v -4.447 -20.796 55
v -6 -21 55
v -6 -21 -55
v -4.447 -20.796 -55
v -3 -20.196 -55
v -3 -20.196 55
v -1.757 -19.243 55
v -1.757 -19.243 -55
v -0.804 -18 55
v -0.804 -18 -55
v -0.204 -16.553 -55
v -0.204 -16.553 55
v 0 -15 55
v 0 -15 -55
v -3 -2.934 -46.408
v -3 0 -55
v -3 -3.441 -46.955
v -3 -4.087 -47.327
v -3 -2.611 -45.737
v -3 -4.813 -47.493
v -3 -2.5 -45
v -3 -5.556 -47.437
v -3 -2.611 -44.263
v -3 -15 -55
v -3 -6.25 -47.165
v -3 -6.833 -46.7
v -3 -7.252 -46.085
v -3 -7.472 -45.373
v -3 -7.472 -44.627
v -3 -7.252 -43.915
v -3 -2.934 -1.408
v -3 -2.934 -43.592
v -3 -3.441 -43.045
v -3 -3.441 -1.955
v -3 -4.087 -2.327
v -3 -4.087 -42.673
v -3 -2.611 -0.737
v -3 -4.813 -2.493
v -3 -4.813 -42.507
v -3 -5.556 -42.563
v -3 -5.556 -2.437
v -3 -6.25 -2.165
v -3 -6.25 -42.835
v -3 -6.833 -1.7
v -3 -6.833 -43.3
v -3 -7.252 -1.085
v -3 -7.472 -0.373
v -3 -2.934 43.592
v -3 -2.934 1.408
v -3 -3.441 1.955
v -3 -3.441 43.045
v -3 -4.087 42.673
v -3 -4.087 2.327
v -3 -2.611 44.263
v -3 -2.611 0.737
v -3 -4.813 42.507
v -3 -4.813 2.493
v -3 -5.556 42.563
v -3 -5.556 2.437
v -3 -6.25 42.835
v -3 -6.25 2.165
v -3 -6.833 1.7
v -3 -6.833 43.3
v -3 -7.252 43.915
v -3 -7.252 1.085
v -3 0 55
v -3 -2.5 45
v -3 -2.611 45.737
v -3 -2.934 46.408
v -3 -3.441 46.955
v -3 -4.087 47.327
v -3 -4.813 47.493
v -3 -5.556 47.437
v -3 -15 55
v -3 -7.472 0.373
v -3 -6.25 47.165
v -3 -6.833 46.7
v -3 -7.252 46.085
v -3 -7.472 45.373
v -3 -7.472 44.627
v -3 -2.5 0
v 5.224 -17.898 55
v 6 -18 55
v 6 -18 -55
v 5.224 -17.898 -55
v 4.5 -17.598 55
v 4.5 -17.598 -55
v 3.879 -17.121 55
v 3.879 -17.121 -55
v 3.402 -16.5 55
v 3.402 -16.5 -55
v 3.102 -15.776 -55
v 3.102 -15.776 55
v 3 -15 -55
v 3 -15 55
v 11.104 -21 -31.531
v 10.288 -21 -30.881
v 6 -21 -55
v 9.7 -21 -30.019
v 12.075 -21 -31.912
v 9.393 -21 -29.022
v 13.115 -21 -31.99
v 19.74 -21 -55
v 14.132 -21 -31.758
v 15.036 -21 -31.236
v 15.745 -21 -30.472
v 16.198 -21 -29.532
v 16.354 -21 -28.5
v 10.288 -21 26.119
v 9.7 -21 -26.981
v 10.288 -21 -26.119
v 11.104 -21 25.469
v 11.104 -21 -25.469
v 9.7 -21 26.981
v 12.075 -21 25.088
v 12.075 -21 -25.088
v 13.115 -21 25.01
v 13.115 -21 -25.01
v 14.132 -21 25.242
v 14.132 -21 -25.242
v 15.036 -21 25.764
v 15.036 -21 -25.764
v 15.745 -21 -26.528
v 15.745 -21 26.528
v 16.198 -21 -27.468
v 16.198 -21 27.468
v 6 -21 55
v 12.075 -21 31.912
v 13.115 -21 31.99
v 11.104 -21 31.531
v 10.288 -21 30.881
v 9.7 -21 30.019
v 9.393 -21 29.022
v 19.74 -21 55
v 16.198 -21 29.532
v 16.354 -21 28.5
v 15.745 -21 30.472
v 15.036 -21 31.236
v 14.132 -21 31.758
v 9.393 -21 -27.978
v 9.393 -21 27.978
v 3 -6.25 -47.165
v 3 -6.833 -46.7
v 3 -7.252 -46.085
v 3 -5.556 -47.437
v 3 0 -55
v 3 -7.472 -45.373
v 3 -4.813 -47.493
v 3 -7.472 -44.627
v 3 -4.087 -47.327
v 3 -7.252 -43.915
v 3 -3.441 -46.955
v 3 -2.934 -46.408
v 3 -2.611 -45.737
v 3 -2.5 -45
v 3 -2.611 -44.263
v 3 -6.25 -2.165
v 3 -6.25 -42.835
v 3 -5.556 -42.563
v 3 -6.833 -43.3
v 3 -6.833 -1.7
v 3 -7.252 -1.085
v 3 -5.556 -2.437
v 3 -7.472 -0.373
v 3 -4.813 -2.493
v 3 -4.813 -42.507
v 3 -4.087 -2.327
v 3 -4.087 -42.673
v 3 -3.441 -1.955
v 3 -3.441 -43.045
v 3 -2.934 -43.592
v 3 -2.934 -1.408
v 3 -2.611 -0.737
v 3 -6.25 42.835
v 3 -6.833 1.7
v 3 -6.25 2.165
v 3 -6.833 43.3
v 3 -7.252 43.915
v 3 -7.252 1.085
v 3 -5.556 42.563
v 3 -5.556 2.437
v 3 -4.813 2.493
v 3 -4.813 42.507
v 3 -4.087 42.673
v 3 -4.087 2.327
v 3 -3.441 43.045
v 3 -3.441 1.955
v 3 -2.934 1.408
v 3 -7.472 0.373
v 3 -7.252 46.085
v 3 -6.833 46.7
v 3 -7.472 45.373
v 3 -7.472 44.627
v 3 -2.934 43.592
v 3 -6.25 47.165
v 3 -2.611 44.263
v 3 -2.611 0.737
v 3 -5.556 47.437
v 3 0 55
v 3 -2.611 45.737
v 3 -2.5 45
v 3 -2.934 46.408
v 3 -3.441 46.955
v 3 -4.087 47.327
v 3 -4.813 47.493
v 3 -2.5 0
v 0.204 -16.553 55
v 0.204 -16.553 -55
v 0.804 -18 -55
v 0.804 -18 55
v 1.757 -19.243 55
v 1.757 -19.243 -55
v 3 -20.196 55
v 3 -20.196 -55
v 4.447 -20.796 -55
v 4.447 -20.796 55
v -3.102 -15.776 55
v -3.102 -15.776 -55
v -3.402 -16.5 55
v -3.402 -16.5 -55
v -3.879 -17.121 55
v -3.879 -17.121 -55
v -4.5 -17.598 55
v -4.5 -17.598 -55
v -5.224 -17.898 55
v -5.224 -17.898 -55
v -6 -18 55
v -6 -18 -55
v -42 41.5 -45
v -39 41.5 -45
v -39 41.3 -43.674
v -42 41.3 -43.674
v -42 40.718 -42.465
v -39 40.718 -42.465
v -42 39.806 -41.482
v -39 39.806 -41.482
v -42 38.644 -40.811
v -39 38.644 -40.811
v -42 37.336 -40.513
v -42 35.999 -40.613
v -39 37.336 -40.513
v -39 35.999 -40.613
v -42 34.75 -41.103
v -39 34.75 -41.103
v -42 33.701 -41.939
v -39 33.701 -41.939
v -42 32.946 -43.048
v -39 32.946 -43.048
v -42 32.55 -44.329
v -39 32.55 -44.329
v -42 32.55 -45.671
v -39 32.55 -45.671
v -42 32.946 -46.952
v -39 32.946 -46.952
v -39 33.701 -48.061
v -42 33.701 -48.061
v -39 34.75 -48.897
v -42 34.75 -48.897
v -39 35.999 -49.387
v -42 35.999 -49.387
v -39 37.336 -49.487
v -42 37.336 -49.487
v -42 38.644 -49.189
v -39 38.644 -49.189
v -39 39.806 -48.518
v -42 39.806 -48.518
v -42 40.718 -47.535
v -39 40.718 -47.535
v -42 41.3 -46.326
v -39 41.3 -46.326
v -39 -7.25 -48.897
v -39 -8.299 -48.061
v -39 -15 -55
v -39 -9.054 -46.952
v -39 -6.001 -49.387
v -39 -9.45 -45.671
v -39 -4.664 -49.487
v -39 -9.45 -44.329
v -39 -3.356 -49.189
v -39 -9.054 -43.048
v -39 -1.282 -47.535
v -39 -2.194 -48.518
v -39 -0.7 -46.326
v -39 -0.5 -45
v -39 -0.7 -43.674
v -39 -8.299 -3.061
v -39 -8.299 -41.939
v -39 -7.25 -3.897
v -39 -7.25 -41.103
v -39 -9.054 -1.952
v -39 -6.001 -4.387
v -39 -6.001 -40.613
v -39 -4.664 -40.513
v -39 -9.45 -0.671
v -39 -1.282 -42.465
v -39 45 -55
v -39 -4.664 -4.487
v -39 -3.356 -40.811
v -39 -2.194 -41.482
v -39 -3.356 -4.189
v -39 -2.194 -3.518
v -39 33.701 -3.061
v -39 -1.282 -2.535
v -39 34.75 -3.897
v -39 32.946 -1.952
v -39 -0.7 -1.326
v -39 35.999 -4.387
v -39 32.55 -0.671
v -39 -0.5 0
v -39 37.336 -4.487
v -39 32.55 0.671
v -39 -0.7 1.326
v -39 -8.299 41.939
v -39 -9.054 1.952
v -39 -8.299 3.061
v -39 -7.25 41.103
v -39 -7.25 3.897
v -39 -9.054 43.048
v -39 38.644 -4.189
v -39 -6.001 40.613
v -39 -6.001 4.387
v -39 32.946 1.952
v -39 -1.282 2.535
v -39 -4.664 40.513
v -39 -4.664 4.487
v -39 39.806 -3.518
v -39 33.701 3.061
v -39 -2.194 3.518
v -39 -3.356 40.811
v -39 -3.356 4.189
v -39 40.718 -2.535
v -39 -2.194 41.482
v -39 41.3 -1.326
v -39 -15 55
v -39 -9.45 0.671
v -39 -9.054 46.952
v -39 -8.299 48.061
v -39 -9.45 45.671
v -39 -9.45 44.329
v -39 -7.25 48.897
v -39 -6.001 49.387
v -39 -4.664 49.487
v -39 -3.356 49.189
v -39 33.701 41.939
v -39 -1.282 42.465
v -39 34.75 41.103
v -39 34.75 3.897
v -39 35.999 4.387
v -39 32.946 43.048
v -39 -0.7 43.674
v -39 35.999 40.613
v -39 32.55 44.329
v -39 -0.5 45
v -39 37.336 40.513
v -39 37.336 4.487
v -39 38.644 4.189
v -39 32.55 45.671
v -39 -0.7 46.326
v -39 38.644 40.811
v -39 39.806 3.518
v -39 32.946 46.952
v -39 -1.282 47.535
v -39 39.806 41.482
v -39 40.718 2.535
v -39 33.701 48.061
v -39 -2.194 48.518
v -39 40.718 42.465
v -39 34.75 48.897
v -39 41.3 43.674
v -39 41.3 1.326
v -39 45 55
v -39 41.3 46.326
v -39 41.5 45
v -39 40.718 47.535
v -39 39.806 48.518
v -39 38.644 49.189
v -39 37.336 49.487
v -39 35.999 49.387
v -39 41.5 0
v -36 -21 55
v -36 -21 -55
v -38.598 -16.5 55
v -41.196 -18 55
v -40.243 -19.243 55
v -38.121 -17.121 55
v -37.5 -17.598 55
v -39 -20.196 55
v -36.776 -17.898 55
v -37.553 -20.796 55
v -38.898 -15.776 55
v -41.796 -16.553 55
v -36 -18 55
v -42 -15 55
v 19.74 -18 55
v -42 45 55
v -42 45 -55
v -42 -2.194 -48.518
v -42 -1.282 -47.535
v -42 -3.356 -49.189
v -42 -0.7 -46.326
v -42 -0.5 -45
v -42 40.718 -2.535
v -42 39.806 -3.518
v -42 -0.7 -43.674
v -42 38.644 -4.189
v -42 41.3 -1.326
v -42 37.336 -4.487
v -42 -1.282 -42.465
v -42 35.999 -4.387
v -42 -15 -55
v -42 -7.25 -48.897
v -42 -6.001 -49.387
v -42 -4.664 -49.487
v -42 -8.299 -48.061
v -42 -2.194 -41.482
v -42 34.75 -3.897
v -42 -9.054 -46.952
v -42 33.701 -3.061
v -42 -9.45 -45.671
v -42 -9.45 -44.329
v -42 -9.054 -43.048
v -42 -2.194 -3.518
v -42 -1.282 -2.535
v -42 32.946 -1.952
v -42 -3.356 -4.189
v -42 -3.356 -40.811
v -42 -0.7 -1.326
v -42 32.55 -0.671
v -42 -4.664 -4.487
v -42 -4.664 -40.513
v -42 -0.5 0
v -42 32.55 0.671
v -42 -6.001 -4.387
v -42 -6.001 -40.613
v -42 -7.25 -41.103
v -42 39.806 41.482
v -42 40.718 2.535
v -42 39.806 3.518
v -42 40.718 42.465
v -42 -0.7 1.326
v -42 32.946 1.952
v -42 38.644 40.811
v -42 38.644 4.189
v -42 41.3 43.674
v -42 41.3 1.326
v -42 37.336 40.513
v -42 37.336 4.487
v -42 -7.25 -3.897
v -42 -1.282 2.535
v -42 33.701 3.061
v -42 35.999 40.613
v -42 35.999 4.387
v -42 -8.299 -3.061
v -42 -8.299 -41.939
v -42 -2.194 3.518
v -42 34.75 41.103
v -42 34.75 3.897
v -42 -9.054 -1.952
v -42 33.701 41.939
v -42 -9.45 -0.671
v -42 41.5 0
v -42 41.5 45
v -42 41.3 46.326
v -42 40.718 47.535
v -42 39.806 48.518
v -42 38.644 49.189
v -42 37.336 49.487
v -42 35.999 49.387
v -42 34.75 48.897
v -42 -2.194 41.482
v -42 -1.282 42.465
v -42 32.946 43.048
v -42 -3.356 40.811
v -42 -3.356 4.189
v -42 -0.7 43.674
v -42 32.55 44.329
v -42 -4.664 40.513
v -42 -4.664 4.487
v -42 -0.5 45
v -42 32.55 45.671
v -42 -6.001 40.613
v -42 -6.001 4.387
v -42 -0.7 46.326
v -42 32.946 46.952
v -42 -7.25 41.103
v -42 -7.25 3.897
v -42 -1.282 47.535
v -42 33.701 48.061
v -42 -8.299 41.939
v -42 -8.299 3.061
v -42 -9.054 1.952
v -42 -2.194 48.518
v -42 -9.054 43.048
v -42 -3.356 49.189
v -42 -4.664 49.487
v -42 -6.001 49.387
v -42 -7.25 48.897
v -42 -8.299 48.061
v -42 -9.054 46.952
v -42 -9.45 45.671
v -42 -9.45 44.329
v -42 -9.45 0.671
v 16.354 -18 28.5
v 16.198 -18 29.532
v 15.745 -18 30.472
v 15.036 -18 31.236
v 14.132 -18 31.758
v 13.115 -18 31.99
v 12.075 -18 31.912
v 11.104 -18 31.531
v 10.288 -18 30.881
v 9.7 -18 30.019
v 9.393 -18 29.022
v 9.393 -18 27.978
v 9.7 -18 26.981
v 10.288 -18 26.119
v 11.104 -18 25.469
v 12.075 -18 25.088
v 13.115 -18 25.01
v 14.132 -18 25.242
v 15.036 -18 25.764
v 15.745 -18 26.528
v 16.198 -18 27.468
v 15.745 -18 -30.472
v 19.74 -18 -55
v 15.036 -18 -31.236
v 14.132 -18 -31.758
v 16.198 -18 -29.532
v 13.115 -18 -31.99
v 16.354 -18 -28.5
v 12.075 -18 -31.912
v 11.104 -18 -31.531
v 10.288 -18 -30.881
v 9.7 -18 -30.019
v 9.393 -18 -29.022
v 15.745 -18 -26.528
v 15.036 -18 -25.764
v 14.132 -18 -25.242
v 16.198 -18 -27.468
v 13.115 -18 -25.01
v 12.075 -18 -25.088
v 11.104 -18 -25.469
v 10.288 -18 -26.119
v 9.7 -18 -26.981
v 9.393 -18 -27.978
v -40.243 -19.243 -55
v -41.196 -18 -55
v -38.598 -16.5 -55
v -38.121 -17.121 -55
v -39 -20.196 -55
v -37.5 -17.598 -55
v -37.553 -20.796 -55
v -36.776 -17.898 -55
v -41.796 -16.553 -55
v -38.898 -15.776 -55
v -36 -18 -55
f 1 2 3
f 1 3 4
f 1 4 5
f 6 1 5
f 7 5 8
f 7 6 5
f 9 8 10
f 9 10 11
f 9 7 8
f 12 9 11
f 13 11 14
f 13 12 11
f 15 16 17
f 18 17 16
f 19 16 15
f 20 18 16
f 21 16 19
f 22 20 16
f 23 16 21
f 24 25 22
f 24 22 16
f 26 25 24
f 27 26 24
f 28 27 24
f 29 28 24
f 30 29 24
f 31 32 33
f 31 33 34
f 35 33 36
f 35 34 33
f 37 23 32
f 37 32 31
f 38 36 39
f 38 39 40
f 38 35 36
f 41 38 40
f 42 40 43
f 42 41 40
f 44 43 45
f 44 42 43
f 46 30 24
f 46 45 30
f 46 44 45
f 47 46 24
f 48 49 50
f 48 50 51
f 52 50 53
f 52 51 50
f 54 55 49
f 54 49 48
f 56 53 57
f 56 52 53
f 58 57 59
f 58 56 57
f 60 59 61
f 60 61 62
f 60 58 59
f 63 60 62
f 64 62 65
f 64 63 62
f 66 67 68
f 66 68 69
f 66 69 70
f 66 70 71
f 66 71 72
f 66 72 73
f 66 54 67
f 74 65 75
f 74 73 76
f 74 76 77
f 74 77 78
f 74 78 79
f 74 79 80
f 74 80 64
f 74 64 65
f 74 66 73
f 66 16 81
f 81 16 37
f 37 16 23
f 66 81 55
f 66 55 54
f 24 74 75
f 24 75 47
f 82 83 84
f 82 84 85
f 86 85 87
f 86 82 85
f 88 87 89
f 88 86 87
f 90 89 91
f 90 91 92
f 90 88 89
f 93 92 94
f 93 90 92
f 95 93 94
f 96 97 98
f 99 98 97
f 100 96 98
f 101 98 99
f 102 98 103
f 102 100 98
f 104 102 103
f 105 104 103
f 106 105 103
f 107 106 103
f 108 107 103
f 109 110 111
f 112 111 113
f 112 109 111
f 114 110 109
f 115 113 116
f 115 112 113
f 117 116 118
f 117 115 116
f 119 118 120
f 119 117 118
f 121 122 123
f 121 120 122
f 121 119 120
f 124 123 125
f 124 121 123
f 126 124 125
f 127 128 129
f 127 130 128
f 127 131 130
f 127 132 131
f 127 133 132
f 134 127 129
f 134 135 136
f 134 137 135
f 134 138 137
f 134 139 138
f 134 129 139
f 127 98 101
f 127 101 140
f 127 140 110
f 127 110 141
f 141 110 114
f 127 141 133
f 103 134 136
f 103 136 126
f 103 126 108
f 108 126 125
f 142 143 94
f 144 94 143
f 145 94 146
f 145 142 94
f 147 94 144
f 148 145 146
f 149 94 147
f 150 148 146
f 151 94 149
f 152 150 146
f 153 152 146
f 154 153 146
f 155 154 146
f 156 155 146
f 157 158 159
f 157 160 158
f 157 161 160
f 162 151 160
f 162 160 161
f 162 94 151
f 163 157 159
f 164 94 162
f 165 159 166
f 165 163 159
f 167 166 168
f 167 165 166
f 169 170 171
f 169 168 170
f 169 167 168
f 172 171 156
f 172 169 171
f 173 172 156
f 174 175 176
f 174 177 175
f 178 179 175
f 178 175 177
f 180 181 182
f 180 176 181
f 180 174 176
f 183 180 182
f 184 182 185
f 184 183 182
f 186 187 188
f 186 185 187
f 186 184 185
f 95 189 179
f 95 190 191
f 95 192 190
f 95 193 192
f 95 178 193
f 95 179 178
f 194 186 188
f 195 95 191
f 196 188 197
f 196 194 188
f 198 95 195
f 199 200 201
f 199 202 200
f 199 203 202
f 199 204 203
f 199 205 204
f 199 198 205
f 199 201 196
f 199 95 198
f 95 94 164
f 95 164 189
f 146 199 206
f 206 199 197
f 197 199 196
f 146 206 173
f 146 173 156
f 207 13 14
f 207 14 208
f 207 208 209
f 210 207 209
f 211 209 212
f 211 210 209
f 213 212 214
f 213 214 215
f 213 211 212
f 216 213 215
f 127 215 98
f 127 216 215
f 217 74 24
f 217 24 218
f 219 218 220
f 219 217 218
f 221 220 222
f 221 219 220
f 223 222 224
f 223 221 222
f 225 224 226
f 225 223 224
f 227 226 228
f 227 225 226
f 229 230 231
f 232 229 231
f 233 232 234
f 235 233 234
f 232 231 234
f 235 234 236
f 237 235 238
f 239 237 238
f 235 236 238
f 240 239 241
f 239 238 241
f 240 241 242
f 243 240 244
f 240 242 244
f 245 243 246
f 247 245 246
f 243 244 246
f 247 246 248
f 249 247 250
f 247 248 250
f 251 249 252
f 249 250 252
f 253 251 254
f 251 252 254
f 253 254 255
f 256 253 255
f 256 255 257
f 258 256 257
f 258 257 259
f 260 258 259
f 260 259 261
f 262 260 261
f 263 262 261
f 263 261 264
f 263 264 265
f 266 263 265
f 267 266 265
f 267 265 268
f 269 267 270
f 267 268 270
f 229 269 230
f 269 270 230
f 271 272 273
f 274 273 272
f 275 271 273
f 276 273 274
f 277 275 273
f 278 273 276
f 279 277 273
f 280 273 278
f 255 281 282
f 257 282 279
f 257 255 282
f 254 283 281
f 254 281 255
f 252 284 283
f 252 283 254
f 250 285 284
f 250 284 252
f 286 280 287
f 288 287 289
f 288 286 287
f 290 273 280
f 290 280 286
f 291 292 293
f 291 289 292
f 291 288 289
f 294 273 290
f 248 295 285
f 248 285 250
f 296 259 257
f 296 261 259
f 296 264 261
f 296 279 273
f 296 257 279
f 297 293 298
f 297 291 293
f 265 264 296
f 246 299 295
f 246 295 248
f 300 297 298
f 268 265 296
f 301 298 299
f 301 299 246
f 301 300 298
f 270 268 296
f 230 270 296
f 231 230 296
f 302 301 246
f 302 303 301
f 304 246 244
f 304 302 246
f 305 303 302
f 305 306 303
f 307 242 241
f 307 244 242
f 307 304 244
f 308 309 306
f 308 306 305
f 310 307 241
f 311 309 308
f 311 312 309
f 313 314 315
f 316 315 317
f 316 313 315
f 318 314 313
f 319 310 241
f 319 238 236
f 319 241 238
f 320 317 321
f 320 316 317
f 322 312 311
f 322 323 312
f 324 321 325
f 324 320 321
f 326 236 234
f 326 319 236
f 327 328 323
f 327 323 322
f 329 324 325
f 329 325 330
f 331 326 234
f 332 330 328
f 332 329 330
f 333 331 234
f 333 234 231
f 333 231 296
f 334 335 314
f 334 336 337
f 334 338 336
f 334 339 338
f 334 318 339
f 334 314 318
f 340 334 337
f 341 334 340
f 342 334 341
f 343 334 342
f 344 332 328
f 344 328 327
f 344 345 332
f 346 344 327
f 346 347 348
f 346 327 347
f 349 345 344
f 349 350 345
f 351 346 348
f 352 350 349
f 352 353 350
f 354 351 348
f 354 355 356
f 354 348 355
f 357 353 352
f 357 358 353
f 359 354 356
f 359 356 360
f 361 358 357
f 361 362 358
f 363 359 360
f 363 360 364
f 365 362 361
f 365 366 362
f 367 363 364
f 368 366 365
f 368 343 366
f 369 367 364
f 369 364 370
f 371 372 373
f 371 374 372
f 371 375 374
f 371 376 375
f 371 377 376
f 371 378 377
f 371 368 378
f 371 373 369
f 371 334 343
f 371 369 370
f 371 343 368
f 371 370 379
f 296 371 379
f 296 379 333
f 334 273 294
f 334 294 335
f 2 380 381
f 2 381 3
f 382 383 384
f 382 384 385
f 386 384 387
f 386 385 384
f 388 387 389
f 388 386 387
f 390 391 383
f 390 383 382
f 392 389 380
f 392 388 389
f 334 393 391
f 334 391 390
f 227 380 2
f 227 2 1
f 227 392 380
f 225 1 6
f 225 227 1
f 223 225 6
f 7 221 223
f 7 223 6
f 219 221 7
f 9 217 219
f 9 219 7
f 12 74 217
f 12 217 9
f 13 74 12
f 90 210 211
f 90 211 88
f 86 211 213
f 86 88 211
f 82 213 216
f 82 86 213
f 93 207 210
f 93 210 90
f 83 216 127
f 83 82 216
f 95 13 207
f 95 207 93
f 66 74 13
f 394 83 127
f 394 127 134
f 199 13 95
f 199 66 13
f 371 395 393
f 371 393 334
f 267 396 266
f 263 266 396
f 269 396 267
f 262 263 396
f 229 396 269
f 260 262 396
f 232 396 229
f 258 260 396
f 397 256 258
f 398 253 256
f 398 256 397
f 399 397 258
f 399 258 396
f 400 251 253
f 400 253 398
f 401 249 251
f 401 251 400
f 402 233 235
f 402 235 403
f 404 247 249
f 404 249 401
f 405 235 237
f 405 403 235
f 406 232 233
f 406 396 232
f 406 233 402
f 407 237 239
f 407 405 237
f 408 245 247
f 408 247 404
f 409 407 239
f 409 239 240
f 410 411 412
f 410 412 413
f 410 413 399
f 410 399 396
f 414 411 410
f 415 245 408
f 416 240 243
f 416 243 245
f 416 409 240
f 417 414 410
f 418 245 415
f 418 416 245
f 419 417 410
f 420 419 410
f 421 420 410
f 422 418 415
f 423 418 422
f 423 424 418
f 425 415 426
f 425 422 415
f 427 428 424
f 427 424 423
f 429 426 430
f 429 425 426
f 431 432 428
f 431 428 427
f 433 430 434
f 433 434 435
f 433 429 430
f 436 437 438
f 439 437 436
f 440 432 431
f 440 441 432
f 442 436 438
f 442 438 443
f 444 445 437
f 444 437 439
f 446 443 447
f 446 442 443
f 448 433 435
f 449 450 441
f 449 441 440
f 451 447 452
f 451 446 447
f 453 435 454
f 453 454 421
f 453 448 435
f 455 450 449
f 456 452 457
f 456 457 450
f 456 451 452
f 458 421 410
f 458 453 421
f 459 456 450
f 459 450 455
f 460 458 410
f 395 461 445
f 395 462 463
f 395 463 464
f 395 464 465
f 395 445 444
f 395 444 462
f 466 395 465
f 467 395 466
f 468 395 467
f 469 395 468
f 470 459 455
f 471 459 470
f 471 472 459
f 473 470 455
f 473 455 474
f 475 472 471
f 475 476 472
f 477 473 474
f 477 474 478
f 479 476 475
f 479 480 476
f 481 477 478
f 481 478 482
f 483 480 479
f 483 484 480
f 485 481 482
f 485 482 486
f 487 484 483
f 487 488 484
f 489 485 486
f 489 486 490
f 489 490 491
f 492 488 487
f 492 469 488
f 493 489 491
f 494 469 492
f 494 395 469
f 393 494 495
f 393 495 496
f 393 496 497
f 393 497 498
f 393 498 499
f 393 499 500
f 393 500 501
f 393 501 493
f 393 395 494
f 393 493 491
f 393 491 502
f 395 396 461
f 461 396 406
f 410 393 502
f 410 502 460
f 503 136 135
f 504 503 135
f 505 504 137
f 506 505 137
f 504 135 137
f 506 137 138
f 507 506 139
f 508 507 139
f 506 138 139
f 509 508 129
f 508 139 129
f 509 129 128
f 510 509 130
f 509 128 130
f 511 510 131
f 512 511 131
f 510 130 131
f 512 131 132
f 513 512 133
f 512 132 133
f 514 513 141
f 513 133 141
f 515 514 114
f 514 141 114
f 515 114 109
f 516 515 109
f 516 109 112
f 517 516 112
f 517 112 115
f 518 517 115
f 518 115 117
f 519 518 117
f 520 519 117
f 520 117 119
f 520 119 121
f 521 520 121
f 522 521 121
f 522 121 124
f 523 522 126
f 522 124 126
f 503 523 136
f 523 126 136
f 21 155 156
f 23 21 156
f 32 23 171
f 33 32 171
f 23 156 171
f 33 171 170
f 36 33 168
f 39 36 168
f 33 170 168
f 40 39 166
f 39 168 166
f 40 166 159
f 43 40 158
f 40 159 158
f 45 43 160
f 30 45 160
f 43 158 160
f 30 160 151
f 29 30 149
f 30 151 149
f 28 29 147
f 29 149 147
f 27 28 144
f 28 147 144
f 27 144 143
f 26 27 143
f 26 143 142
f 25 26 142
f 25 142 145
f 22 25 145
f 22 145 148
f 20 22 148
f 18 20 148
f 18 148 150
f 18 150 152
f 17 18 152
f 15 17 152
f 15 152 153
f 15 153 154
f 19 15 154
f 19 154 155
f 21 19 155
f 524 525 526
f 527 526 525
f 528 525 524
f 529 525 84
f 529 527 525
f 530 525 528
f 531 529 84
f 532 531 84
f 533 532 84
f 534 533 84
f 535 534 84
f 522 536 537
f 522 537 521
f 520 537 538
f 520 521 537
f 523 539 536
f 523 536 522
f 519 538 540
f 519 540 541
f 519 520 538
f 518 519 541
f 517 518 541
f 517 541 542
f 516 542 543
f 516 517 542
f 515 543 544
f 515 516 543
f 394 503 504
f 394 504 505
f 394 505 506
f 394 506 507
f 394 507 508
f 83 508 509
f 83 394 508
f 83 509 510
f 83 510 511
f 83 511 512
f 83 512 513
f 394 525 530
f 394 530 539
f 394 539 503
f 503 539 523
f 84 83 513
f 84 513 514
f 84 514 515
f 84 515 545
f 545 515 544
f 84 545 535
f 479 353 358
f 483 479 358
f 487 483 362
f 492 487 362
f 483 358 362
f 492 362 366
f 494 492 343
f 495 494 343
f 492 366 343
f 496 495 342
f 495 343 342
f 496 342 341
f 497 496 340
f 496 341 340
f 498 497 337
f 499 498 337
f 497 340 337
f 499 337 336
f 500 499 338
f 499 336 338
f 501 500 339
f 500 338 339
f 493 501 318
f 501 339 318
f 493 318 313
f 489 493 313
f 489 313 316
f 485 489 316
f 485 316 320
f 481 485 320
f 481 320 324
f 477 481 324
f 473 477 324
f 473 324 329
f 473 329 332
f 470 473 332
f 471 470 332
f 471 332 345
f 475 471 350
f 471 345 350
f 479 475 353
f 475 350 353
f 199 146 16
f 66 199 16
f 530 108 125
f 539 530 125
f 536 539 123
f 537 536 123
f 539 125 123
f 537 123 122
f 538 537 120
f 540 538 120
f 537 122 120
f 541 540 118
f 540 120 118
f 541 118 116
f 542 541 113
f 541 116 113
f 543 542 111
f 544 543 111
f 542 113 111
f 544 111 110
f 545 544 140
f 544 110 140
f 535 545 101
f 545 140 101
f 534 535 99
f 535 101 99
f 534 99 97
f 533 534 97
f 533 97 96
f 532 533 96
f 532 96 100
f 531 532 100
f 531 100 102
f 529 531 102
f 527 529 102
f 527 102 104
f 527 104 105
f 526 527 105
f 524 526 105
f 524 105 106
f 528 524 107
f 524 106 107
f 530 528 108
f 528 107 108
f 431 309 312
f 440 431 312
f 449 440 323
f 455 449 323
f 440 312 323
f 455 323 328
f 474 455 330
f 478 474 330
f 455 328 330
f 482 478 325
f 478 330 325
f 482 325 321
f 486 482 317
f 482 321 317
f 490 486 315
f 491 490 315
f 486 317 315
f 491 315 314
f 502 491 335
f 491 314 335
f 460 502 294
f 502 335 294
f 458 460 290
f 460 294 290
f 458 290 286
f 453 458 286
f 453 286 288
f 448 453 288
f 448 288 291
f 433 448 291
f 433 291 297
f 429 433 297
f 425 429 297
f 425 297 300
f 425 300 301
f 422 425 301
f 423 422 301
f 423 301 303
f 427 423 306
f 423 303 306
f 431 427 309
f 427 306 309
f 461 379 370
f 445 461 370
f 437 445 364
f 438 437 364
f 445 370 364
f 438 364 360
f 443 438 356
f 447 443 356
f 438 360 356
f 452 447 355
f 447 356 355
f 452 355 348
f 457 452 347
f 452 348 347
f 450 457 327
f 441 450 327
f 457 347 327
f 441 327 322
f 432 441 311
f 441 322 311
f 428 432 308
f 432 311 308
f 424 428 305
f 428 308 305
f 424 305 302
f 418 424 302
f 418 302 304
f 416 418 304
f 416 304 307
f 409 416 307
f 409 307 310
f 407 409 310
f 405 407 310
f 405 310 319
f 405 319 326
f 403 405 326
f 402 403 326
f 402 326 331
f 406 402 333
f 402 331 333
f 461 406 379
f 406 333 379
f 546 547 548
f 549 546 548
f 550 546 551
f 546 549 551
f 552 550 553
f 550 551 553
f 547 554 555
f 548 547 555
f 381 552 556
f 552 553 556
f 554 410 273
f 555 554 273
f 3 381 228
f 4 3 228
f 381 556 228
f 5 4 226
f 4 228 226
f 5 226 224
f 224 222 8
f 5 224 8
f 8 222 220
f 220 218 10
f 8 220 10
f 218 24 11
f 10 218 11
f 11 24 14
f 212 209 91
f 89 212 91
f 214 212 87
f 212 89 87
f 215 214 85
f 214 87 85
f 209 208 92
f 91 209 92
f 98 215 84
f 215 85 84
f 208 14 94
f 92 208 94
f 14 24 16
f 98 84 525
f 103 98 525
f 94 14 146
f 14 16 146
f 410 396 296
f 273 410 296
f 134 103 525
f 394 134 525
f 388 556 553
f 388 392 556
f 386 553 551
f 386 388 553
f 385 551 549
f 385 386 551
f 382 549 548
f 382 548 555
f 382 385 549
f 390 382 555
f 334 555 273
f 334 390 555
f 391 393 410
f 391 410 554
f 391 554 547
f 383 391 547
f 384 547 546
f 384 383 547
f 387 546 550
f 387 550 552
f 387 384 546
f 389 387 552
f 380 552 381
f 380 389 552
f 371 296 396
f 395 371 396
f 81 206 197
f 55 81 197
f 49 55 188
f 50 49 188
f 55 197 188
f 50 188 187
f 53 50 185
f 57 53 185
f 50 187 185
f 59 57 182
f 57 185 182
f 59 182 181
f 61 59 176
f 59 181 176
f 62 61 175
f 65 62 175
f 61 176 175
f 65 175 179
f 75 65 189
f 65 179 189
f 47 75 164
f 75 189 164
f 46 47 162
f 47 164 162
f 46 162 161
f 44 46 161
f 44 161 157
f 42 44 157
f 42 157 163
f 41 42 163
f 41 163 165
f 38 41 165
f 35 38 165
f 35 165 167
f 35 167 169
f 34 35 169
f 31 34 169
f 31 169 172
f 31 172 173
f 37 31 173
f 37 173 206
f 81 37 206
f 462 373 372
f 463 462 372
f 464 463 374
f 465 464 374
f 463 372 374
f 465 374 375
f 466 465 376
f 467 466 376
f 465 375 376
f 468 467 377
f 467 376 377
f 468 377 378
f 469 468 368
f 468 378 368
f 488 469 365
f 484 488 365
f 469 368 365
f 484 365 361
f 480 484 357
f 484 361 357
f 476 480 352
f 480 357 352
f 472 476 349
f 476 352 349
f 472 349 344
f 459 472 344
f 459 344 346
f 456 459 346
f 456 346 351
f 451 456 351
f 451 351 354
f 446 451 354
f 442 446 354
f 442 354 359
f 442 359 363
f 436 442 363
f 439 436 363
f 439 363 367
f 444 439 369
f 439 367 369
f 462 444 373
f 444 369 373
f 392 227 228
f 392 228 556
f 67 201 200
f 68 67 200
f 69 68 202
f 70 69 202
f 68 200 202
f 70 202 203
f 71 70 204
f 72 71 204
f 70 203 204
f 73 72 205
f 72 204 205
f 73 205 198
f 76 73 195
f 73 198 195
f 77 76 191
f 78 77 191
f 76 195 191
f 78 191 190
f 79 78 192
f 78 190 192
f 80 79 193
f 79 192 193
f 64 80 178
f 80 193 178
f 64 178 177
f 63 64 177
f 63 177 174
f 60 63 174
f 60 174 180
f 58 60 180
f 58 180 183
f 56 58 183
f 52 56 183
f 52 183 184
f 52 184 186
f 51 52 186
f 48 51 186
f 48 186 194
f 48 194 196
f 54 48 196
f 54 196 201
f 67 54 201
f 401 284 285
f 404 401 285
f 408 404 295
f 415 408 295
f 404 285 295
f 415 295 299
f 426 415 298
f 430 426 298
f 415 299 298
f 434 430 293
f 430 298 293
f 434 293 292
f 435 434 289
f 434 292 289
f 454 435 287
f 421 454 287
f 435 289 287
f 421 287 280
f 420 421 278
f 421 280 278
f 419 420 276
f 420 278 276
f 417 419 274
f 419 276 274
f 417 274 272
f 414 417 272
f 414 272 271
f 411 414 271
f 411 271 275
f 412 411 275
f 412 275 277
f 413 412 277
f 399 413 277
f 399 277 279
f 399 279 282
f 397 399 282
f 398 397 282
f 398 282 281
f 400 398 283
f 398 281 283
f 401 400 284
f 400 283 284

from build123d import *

# Parameters (mm, degrees)
F1_DEPTH      = 55
F1_DEPTH_BACK = 55
F2_R          = 2.5
F3_DEPTH      = 45.001
F4_R          = 4.5
F5_DEPTH      = 3
F6_R          = 4.5
F7_DEPTH      = 3
F8_R          = 3.5
F9_DEPTH      = 3


with BuildPart() as f1:
    # F0 (on Top) → F1 (new body, two sides)
    with BuildSketch(Plane.XY) as f1_sk:
        with BuildLine():
            Line((-39, 45), (-42, 45))
            Line((-42, 45), (-42, -15))
            ThreePointArc((-42, -15), (-40.242641, -19.242641), (-36, -21))
            Line((-36, -21), (-6, -21))
            ThreePointArc((-6, -21), (-1.757359, -19.242641), (0, -15))
            ThreePointArc((0, -15), (1.757359, -19.242641), (6, -21))
            Line((6, -21), (19.739676, -21))
            Line((19.739676, -21), (19.739676, -18))
            Line((19.739676, -18), (6, -18))
            ThreePointArc((6, -18), (3.87868, -17.12132), (3, -15))
            Line((3, -15), (3, 0))
            Line((3, 0), (-3, 0))
            Line((-3, 0), (-3, -15))
            ThreePointArc((-3, -15), (-3.87868, -17.12132), (-6, -18))
            Line((-6, -18), (-36, -18))
            ThreePointArc((-36, -18), (-38.12132, -17.12132), (-39, -15))
            Line((-39, -15), (-39, 45))
        make_face()
    extrude(amount=F1_DEPTH)
    extrude(f1_sk.sketch, amount=-F1_DEPTH_BACK)

    # F2 (on face) → F3 (cut, through all)
    with BuildSketch(Plane.YZ.offset(3)):
        with Locations((-5, 45)):
            Circle(F2_R)
        with Locations((-5, 0)):
            Circle(F2_R)
        with Locations((-5, -45)):
            Circle(F2_R)
    extrude(amount=-F3_DEPTH, mode=Mode.SUBTRACT)

    # F4 (on face) → F5 (cut)
    with BuildSketch(Plane.YZ.offset(-39)):
        with Locations((-5, 45)):
            Circle(F4_R)
        with Locations((-5, 0)):
            Circle(F4_R)
        with Locations((-5, -45)):
            Circle(F4_R)
    extrude(amount=-F5_DEPTH, mode=Mode.SUBTRACT)

    # F6 (on face) → F7 (cut)
    with BuildSketch(Plane.YZ.offset(-39)):
        with Locations((37, 0)):
            Circle(F6_R)
        with Locations((37, -45)):
            Circle(F6_R)
        with Locations((37, 45)):
            Circle(F6_R)
    extrude(amount=-F7_DEPTH, mode=Mode.SUBTRACT)

    # F8 (on face) → F9 (cut)
    with BuildSketch(Plane.XZ.offset(21)):
        with Locations((12.85351, 28.5)):
            Circle(F8_R)
        with Locations((12.85351, -28.5)):
            Circle(F8_R)
    extrude(amount=-F9_DEPTH, mode=Mode.SUBTRACT)


solid = f1.part
